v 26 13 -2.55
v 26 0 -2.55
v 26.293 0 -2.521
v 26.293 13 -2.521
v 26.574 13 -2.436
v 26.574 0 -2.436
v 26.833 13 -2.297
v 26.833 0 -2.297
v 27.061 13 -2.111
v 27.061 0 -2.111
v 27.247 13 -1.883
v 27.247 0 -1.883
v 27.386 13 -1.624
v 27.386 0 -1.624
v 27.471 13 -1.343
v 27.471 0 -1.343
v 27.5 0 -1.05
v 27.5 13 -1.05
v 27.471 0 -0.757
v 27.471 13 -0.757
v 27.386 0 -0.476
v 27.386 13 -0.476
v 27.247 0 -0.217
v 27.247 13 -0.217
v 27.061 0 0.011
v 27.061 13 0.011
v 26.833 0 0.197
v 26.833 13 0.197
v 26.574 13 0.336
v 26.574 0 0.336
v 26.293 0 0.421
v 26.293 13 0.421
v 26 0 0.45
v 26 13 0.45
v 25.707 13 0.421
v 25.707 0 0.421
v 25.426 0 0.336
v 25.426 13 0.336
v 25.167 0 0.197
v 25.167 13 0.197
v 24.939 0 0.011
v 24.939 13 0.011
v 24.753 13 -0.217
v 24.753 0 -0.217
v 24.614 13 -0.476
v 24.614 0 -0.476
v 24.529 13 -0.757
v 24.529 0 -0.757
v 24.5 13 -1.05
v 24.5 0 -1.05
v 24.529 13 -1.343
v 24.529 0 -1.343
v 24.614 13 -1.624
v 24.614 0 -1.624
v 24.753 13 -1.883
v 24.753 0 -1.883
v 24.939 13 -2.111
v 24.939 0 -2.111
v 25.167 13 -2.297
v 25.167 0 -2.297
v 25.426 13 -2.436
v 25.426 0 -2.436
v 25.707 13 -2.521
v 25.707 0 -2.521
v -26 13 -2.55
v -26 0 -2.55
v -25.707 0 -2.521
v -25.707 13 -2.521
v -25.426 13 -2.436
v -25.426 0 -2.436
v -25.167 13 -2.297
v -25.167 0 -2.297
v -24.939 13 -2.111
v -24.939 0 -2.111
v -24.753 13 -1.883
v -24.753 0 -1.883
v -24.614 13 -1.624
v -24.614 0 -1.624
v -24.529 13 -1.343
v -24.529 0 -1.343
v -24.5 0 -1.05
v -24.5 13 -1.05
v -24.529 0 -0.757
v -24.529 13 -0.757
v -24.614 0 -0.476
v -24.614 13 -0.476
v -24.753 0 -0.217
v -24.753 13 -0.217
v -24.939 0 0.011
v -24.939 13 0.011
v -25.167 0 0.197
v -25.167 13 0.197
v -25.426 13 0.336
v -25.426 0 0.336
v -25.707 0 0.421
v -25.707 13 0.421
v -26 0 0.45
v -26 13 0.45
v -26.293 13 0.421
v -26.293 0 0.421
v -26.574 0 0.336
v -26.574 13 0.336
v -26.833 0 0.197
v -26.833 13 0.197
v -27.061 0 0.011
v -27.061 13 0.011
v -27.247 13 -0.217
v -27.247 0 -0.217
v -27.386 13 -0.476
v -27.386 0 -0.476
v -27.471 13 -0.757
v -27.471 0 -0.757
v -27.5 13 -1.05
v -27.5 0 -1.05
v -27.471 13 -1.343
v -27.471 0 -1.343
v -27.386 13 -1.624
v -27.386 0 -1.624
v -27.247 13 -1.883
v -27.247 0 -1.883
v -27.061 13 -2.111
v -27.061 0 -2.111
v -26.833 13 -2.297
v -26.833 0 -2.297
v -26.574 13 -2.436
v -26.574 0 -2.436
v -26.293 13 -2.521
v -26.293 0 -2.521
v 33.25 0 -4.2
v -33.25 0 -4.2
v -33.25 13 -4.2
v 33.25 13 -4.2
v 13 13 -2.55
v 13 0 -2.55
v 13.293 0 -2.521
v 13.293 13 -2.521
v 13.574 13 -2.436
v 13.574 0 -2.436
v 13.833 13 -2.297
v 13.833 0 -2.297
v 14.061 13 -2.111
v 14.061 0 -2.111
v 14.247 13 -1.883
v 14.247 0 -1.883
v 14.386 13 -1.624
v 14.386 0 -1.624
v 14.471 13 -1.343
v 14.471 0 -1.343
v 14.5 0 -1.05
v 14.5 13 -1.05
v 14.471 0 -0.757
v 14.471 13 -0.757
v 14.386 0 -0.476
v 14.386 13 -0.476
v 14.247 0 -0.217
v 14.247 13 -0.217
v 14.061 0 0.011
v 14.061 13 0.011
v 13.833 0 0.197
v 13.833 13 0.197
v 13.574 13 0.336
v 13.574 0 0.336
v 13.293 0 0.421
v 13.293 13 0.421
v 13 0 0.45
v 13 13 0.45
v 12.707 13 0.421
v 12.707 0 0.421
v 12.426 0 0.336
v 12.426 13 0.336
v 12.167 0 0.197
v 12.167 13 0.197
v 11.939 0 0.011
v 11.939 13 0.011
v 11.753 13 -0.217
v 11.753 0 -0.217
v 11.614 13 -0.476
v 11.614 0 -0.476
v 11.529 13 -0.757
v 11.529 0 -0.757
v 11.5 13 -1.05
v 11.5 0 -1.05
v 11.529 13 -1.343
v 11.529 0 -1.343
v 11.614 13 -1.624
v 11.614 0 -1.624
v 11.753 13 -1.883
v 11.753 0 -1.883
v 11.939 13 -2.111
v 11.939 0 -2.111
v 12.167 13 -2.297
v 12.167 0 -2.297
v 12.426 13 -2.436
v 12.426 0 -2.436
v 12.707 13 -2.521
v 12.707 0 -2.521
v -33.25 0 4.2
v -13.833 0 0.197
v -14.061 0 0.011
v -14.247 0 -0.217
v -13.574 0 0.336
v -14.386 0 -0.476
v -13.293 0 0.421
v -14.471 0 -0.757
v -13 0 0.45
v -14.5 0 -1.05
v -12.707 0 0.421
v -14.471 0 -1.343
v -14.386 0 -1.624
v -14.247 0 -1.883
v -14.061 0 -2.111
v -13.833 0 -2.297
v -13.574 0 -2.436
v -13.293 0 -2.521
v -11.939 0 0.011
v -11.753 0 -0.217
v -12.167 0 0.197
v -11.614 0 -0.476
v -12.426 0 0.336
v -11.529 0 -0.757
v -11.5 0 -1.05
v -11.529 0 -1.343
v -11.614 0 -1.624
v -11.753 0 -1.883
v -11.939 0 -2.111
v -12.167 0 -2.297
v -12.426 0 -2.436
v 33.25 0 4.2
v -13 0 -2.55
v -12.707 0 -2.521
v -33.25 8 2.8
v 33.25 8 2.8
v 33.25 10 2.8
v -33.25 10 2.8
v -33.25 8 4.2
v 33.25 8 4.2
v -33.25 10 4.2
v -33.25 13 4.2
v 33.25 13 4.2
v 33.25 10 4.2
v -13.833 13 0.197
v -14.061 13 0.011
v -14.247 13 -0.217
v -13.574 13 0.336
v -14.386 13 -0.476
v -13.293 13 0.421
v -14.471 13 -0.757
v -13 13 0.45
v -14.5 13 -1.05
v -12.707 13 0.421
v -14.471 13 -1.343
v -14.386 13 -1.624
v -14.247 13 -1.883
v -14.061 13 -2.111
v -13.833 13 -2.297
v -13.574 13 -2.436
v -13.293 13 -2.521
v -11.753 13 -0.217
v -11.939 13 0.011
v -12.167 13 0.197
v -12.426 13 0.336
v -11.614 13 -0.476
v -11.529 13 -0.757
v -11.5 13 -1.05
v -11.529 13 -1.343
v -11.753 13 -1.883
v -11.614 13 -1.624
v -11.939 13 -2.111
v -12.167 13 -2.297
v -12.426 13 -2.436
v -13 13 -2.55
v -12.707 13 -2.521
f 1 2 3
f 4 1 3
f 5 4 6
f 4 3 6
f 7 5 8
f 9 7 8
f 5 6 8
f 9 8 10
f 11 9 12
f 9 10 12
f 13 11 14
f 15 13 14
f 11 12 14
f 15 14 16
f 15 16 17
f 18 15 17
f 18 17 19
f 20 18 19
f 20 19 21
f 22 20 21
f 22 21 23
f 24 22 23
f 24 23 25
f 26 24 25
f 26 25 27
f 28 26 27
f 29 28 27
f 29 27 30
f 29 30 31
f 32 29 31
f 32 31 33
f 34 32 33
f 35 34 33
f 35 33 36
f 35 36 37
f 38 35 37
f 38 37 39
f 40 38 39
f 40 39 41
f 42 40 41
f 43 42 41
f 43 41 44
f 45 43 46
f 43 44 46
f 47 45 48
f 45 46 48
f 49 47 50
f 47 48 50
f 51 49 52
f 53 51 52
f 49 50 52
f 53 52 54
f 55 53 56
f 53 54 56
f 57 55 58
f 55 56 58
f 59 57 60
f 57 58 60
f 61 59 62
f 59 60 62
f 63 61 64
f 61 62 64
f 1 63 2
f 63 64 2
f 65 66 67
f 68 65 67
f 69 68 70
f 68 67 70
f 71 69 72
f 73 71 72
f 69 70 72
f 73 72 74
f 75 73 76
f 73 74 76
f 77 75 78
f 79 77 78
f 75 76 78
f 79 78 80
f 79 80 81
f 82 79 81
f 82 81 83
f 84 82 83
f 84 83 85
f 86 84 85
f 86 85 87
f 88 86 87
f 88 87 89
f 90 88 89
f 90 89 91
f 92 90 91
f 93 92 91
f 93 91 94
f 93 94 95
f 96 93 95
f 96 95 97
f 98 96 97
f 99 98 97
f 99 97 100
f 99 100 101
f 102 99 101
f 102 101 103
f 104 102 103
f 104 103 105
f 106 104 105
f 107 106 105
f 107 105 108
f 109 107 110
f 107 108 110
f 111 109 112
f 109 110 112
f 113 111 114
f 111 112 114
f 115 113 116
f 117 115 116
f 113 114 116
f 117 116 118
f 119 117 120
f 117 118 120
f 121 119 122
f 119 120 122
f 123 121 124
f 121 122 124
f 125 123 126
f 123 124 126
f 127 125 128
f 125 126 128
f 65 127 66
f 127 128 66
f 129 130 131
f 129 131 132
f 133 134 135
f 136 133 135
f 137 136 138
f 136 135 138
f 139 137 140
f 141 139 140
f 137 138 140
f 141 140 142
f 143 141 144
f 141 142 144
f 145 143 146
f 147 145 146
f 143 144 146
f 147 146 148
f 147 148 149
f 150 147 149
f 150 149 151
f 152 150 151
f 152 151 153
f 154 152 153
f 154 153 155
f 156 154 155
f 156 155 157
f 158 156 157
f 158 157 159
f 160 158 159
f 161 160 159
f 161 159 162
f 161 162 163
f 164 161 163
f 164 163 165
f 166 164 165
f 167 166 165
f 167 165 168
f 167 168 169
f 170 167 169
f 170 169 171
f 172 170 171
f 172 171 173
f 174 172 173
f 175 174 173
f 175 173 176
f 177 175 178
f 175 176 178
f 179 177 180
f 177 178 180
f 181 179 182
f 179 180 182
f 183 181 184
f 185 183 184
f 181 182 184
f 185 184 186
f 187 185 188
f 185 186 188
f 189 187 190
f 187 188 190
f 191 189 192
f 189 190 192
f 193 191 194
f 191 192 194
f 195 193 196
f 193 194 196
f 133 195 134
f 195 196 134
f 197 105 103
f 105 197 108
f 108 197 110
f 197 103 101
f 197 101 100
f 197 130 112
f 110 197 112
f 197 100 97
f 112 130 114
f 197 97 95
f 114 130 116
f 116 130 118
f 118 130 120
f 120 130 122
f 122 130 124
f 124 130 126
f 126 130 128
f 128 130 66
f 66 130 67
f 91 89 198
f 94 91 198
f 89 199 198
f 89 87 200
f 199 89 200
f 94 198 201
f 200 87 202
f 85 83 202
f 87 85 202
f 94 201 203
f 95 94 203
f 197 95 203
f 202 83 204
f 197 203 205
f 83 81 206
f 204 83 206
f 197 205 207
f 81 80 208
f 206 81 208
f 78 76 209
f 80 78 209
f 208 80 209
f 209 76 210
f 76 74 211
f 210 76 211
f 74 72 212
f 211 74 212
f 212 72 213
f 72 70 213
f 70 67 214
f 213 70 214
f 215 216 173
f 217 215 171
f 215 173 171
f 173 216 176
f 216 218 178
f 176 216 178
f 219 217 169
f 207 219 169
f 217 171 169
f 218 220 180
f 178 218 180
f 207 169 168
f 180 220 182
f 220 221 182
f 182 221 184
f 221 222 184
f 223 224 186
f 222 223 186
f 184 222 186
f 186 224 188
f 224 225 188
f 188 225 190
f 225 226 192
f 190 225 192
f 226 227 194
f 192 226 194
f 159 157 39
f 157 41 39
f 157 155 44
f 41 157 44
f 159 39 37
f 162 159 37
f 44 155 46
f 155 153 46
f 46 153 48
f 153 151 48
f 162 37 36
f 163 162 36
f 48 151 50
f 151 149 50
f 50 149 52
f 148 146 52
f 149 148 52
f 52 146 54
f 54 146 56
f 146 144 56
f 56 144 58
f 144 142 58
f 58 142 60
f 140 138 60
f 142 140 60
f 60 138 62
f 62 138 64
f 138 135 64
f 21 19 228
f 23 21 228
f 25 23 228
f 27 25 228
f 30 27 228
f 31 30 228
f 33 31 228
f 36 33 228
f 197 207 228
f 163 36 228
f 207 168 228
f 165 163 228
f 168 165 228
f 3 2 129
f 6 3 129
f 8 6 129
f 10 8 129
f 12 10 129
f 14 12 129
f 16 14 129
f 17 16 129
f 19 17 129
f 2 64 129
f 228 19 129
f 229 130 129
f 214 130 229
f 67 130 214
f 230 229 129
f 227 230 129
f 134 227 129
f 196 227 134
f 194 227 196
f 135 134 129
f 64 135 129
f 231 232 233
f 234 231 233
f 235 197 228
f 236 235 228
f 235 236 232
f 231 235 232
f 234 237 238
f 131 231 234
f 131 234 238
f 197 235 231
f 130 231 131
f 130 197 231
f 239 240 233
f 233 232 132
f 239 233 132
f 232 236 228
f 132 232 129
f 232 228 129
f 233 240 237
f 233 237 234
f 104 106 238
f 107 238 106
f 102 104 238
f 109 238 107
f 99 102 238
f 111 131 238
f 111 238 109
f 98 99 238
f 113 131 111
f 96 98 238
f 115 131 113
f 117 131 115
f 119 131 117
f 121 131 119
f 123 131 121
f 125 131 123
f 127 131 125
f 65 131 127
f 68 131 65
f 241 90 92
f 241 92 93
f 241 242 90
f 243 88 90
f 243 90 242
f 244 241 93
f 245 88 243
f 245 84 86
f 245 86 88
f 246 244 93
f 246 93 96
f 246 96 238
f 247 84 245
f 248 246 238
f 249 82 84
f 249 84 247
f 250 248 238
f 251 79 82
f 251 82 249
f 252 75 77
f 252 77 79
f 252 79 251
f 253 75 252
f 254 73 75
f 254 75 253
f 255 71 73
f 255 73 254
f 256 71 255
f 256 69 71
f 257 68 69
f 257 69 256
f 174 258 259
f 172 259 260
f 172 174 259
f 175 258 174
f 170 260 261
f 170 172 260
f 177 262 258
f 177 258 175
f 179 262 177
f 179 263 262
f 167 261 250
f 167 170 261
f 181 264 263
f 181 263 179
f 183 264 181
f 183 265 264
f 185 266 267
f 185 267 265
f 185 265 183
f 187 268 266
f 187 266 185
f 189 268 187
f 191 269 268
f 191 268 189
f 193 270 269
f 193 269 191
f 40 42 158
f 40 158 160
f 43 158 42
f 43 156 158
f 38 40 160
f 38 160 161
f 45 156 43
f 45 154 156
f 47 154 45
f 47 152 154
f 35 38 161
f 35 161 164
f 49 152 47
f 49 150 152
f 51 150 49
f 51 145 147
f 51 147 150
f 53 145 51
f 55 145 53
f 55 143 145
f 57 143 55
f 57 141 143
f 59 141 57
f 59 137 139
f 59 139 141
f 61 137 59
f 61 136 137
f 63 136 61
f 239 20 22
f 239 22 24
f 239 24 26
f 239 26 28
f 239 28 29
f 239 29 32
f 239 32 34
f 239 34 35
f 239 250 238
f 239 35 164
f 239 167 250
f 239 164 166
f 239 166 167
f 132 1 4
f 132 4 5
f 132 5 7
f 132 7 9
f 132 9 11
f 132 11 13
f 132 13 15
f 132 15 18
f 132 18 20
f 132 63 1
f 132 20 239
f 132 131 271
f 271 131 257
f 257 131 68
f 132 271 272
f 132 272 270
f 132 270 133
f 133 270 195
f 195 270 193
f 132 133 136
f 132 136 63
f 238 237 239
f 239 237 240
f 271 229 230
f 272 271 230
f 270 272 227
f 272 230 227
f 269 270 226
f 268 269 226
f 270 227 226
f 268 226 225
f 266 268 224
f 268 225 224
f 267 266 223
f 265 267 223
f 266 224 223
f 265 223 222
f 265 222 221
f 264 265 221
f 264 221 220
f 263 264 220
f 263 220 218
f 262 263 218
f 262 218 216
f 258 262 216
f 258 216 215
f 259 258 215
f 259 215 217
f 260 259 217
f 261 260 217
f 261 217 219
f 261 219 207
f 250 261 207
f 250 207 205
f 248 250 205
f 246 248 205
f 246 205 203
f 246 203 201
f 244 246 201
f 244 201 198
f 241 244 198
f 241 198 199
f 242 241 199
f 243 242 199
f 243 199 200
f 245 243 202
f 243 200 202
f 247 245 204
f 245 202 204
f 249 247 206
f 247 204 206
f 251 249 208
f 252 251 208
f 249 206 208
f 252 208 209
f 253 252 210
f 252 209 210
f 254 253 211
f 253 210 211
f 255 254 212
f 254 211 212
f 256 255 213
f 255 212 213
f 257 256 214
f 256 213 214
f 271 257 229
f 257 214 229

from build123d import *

# Parameters (mm, degrees)
SKETCH_1_W          = 66.5
SKETCH_1_H          = 8.4
EXTRUDE_1_DEPTH     = 13
SKETCH_2_W          = 1.4
SKETCH_2_H          = 2
CUT_EXTRUDE_1_DEPTH = 104
SKETCH_4_R          = 1.5
CUT_EXTRUDE_3_DEPTH = 36.947218251


with BuildPart() as part:
    # 草图1 → 凸台-拉伸1 (new body)
    with BuildSketch(Plane(origin=(0, 0, 0), x_dir=(1, 0, 0), z_dir=(0, 1, 0))):
        Rectangle(SKETCH_1_W, SKETCH_1_H)
    extrude(amount=EXTRUDE_1_DEPTH)

    # 草图2 → 切除-拉伸1 (cut)
    with BuildSketch(Plane(origin=(33.25, 0, 0), x_dir=(0, 0, -1), z_dir=(1, 0, 0))):
        with Locations((-3.5, 9)):
            Rectangle(SKETCH_2_W, SKETCH_2_H)
    extrude(amount=-CUT_EXTRUDE_1_DEPTH, mode=Mode.SUBTRACT)

    # 草图4 → 切除-拉伸3 (cut, through all)
    with BuildSketch(Plane.XZ):
        with Locations(Location((-26, -1.05, 0), (0, 0, 270))):
            Circle(SKETCH_4_R)
        with Locations(Location((-13, -1.05, 0), (0, 0, 270))):
            Circle(SKETCH_4_R)
        with Locations(Location((26, -1.05, 0), (0, 0, 270))):
            Circle(SKETCH_4_R)
        with Locations(Location((13, -1.05, 0), (0, 0, 270))):
            Circle(SKETCH_4_R)
    extrude(amount=-CUT_EXTRUDE_3_DEPTH, mode=Mode.SUBTRACT)


solid = part.part
